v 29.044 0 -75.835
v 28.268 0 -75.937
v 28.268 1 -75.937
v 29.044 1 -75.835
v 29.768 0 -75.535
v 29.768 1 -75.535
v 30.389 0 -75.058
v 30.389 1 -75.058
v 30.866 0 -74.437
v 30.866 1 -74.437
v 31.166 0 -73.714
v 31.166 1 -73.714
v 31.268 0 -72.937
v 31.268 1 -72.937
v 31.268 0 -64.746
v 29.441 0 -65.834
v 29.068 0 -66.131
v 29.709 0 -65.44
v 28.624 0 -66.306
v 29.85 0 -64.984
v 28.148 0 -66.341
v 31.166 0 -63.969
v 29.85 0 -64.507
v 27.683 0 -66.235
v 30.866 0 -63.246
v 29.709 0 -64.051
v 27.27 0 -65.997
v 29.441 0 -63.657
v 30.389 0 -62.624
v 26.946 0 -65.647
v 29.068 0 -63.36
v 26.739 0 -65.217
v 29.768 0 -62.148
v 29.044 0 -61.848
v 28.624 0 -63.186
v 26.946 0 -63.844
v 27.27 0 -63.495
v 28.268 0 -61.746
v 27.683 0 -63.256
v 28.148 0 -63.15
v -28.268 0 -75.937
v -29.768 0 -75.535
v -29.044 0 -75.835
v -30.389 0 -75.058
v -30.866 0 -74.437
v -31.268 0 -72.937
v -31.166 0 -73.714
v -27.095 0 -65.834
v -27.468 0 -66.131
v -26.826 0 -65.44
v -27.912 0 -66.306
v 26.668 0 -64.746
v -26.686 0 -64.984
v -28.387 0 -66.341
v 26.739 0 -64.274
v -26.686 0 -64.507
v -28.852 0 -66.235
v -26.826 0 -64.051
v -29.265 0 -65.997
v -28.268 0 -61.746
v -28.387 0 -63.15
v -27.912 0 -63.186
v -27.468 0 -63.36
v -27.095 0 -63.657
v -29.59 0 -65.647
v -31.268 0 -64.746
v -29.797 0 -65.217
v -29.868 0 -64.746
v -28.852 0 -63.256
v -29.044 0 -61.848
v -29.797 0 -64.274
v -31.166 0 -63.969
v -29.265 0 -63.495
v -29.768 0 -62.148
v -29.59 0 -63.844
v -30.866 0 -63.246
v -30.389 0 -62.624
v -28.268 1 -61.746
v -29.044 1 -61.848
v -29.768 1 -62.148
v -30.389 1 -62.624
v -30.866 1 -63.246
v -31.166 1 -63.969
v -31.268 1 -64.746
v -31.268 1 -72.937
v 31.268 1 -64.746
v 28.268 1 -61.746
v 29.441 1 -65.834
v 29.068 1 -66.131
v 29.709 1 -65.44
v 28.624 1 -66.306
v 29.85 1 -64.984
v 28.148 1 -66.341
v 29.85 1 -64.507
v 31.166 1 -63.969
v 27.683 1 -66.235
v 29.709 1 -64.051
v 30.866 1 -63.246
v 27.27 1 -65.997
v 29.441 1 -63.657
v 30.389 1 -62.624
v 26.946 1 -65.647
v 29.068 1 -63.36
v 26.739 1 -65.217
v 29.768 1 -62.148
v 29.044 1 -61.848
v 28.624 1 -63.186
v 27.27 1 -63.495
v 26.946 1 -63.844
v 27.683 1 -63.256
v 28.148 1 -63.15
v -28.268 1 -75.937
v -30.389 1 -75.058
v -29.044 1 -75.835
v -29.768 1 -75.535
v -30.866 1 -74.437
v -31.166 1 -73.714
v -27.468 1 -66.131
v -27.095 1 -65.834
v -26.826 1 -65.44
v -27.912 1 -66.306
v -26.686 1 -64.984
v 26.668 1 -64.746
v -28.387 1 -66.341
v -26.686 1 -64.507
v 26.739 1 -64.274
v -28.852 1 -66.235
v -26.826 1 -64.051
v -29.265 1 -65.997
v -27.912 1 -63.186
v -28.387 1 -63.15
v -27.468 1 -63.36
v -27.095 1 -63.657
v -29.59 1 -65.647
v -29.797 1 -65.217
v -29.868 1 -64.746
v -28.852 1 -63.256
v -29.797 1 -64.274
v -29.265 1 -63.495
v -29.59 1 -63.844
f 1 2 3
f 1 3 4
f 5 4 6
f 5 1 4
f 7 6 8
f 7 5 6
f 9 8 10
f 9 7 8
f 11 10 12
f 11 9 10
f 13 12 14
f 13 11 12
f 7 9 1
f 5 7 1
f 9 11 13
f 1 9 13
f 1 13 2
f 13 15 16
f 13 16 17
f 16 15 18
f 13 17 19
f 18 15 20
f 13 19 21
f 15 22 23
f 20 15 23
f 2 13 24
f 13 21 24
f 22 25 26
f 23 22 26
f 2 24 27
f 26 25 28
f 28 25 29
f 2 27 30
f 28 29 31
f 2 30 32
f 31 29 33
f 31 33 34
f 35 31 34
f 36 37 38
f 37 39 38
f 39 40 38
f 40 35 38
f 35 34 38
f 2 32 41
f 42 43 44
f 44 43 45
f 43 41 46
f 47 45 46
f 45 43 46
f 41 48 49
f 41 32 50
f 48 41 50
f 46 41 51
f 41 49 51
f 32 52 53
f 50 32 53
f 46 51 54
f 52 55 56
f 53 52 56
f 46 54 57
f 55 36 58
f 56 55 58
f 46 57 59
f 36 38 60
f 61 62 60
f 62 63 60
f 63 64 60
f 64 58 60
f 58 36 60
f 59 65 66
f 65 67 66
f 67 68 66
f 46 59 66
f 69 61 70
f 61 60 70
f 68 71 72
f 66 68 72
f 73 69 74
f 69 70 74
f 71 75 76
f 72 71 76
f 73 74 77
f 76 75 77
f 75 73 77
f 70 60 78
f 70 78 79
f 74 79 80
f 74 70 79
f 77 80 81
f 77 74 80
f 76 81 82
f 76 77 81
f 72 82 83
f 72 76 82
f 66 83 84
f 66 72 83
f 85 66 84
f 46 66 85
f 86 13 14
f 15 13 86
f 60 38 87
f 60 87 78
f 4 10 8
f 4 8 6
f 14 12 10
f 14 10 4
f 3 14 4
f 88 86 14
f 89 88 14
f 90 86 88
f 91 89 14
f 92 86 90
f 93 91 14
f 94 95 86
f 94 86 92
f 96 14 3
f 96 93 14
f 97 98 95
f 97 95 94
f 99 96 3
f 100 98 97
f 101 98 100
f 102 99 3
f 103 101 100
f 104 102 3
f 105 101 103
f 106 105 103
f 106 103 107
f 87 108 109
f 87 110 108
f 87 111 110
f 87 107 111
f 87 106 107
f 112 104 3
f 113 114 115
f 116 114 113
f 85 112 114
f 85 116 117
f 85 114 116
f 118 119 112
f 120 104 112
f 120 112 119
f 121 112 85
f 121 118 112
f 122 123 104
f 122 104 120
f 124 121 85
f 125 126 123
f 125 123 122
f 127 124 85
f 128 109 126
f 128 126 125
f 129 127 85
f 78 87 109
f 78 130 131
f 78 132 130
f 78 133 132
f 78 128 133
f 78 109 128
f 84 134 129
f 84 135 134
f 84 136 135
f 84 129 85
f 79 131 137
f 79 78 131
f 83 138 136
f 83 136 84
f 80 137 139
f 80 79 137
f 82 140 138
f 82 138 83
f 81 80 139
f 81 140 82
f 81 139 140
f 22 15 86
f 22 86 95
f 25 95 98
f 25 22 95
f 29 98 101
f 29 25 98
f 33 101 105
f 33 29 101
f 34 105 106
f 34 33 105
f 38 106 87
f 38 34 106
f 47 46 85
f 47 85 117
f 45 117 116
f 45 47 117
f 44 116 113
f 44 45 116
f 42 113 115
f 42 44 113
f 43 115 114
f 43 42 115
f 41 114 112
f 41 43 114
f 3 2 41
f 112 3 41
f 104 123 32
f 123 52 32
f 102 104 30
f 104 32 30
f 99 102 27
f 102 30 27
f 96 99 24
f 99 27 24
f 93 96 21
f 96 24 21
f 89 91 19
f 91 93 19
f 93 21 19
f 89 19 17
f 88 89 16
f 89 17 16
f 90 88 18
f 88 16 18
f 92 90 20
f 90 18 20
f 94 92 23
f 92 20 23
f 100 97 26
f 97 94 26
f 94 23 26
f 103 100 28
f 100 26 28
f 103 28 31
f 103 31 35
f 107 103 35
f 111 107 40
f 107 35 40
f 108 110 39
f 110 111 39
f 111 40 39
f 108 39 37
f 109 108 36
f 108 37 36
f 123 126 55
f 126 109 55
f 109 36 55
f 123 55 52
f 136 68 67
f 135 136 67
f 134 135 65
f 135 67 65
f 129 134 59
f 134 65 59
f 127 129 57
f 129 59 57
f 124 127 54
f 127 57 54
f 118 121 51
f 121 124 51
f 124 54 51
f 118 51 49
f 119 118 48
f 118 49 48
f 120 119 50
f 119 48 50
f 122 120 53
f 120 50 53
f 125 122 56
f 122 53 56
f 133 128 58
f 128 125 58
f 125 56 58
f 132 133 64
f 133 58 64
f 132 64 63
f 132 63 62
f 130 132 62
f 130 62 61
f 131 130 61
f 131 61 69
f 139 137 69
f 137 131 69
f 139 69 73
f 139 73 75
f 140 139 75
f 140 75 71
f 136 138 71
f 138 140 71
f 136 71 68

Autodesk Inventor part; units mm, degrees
ref_plane "YZ Plane" through (0, 0, 0) normal (1, 0, 0) x (0, 1, 0)
ref_plane "XZ Plane" through (0, 0, 0) normal (0, 1, 0) x (-1, 0, 0)
ref_plane "XY Plane" through (0, 0, 0) normal (0, 0, 1) x (1, 0, 0)
sketch "Sketch1" plane through (0, 0, 0) normal (0, 1, 0) x (-1, 0, 0)
  circle A0 centre (28.2679, -64.7457) radius 1.6
  circle A1 centre (-28.2679, -64.7457) radius 1.6
  arc A2 (31.2679, -64.7457) -> (28.2679, -61.7457) centre (28.2679, -64.7457) ccw
  arc A3 (-28.2679, -61.7457) -> (-31.2679, -64.7457) centre (-28.2679, -64.7457) ccw
  line L0 (-28.2679, -61.7457) -> (28.2679, -61.7457)
  line L1 (48.3297, -88.9468) -> (2.1402, -66.9602)
  line L2 (-2.1585, -66.9605) -> (-48.3297, -88.9468)
  arc A4 (2.1402, -66.9602) -> (-2.1585, -66.9605) centre (-0.0088, -71.4748) ccw
  line L3 (-0.0092, -65.9371) -> (-0.0092, -75.9371)
  line L4 (-0.0092, -75.9371) -> (28.2679, -75.9371)
  line L5 (-0.0092, -75.9371) -> (-28.2679, -75.9371)
  line L6 (-31.2679, -72.9371) -> (-31.2679, -64.7457)
  line L7 (31.2679, -64.7457) -> (31.2679, -72.9371)
  arc A5 (28.2679, -75.9371) -> (31.2679, -72.9371) centre (28.2679, -72.9371) ccw
  arc A6 (-31.2679, -72.9371) -> (-28.2679, -75.9371) centre (-28.2679, -72.9371) ccw
  point P0 (0, 0)
  dimension "d0" = 3.2
  dimension "d1" = 3
  dimension "d2" = 3
  dimension "d3" = 5
  dimension "d4" = 10
  dimension "d5" = 3
  dimension "d8" = 14.1913
  dimension "d9" = 62.5358
extrude "Extrusion1" add sketch "Sketch1" along normal blind 1
properties part number "Light sensor ball guard"
